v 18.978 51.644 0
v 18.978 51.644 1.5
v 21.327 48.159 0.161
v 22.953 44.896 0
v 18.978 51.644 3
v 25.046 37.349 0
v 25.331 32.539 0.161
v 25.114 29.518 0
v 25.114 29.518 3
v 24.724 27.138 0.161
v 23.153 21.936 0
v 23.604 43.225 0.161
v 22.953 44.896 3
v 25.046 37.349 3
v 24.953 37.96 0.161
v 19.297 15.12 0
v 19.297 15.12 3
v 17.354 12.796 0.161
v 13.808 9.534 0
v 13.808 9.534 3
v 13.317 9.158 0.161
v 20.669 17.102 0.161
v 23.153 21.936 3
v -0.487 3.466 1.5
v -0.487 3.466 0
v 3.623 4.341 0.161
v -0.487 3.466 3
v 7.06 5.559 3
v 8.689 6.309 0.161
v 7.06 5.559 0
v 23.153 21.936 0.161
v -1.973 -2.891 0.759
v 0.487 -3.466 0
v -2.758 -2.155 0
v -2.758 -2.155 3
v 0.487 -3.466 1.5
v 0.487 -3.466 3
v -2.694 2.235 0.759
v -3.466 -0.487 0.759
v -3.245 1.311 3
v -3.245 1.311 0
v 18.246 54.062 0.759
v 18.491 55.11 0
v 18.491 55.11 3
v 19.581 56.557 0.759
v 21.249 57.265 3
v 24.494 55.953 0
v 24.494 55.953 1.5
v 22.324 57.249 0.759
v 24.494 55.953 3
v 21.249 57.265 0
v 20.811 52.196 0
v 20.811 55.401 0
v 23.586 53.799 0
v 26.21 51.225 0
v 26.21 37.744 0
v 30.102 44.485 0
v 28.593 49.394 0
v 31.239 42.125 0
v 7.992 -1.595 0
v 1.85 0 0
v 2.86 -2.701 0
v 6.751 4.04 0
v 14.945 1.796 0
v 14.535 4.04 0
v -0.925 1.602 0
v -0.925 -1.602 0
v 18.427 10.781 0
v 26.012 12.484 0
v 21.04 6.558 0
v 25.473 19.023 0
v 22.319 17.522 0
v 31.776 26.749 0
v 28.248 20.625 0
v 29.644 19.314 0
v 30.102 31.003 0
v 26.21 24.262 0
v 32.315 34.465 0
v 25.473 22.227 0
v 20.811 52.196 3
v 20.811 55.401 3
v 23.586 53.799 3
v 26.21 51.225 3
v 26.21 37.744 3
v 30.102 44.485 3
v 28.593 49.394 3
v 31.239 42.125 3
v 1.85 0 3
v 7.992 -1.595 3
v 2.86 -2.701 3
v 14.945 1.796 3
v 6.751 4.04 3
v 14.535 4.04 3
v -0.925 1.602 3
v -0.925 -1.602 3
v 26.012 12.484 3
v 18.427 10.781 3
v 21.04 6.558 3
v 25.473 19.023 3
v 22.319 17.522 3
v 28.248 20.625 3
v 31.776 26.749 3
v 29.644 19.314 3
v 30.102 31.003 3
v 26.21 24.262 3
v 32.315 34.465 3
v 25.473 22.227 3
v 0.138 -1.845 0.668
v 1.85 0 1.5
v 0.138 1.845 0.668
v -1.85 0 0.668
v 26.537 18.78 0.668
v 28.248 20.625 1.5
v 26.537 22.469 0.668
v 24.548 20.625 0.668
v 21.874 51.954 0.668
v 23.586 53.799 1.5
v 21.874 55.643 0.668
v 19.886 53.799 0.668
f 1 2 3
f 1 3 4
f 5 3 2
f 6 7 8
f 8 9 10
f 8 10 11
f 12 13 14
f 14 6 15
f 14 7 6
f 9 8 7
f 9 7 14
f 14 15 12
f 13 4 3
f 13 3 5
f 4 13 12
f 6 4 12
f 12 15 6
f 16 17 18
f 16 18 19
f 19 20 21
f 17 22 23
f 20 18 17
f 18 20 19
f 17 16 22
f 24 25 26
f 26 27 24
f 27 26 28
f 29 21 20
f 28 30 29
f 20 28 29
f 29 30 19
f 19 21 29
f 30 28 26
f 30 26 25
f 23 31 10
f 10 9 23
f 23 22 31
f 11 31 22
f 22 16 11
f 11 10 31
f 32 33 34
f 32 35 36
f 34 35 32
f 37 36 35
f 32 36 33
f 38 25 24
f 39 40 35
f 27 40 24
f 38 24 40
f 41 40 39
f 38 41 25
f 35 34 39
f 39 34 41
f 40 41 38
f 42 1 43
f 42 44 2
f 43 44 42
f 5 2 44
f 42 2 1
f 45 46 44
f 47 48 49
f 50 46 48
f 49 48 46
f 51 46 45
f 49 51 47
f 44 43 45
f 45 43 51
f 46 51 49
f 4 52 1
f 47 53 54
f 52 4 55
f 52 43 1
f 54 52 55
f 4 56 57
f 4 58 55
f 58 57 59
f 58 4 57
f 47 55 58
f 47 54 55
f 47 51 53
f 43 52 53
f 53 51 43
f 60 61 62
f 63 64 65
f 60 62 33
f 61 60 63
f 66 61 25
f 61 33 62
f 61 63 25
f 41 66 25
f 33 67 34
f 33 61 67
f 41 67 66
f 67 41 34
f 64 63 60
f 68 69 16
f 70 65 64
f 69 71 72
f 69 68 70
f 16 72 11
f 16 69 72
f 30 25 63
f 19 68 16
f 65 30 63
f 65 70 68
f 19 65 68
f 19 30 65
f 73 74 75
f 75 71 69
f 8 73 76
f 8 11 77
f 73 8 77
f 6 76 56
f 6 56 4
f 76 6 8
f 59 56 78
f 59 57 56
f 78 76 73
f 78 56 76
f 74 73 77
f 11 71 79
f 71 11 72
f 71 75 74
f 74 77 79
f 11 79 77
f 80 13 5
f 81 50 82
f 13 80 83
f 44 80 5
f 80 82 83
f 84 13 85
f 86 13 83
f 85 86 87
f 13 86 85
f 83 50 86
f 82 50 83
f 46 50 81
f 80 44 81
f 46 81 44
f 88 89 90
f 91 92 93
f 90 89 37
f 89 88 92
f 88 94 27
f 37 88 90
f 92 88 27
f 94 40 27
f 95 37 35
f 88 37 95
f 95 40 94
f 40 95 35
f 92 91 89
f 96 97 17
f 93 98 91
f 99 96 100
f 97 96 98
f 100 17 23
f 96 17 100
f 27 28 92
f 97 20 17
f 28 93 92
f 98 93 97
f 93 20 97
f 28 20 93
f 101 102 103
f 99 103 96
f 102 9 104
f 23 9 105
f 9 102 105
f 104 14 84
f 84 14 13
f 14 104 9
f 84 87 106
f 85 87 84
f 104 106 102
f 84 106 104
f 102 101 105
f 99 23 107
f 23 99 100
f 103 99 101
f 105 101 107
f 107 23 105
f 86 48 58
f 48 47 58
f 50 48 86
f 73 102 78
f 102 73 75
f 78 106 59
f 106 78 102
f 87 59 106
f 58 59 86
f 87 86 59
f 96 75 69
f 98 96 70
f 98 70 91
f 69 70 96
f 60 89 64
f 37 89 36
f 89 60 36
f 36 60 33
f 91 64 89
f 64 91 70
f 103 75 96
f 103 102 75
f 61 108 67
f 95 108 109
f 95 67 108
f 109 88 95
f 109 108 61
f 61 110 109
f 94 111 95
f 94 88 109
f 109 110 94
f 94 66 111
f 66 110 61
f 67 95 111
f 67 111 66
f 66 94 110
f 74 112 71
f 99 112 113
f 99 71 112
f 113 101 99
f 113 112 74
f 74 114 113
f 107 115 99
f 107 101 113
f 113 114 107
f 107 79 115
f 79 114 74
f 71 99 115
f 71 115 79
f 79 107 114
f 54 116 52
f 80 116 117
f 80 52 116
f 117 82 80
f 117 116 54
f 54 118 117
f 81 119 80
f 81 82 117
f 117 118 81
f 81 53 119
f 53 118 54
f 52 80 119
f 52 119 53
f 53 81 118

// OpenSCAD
// CSG file generated from FreeCAD 0.18.1.
group() {
 group(){
polyhedron ( points = [[-0.487106,3.465938,0.000000],[-0.487106,3.465938,3.000000],[18.978024,51.643826,0.000000],[18.978024,51.643826,3.000000],[0.487106,-3.465938,0.000000],[0.487106,-3.465938,3.000000],[24.494099,55.953453,0.000000],[24.494099,55.953453,3.000000],[1.850000,-0.000000,0.000000],[28.248360,20.624659,0.000000],[23.586061,53.798641,0.000000],[1.850000,-0.000000,3.000000],[28.248360,20.624659,3.000000],[23.586061,53.798641,3.000000],[-0.487106,3.465938,1.500000],[18.978024,51.643826,1.500000],[7.059635,5.558835,0.000000],[13.807546,9.533658,0.000000],[19.296766,15.119530,0.000000],[23.153217,21.935783,0.000000],[25.114086,29.517900,0.000000],[25.045744,37.349174,0.000000],[22.952847,44.895916,0.000000],[7.059635,5.558835,3.000000],[13.807546,9.533658,3.000000],[19.296766,15.119530,3.000000],[23.153217,21.935783,3.000000],[25.114086,29.517900,3.000000],[25.045744,37.349174,3.000000],[22.952847,44.895916,3.000000],[0.487106,-3.465938,1.500000],[-3.245143,1.311123,0.000000],[-2.758038,-2.154815,0.000000],[-3.245143,1.311123,3.000000],[-2.758038,-2.154815,3.000000],[24.494099,55.953453,1.500000],[21.248955,57.264580,0.000000],[18.490917,55.109764,0.000000],[21.248955,57.264580,3.000000],[18.490917,55.109764,3.000000],[7.992446,-1.594647,0.000000],[14.944714,1.796201,0.000000],[21.040060,6.558408,0.000000],[26.012091,12.483843,0.000000],[29.643503,19.313536,0.000000],[31.775587,26.748999,0.000000],[32.315163,34.465263,0.000000],[31.238644,42.125092,0.000000],[28.593081,49.393711,0.000000],[-0.925000,1.602147,0.000000],[-0.925000,-1.602147,0.000000],[25.473360,22.226807,0.000000],[25.473360,19.022512,0.000000],[20.811062,55.400787,0.000000],[20.811062,52.196491,0.000000],[7.992446,-1.594647,3.000000],[14.944714,1.796201,3.000000],[21.040060,6.558408,3.000000],[26.012091,12.483843,3.000000],[29.643503,19.313536,3.000000],[31.775587,26.748999,3.000000],[32.315163,34.465263,3.000000],[31.238644,42.125092,3.000000],[28.593081,49.393711,3.000000],[-0.925000,-1.602147,3.000000],[-0.925000,1.602147,3.000000],[25.473360,19.022512,3.000000],[25.473360,22.226807,3.000000],[20.811062,52.196491,3.000000],[20.811062,55.400787,3.000000],[1.850000,-0.000000,1.500000],[28.248360,20.624659,1.500000],[23.586061,53.798641,1.500000],[21.326979,48.159222,0.160588],[24.953423,37.960323,0.160588],[24.724274,27.138304,0.160588],[20.669365,17.102055,0.160588],[13.316594,9.158165,0.160588],[3.623200,4.340831,0.160588],[25.330978,32.538895,0.160588],[23.603994,43.224686,0.160588],[17.354227,12.795743,0.160588],[8.688965,6.308692,0.160588],[23.153217,21.935783,0.160588],[-2.693777,2.234628,0.758522],[-1.973478,-2.890568,0.758522],[-3.465938,-0.487106,0.758522],[22.324417,57.248833,0.758522],[18.246017,54.062439,0.758522],[19.581245,56.556679,0.758522],[30.102057,44.484524,0.000000],[6.751485,4.040147,0.000000],[2.859724,-2.700582,0.000000],[26.210295,51.225250,0.000000],[14.535009,4.040147,0.000000],[18.426771,10.780876,0.000000],[22.318533,17.521606,0.000000],[26.210295,24.262335,0.000000],[30.102057,31.003063,0.000000],[26.210295,37.743793,0.000000],[30.102057,44.484524,3.000000],[6.751485,4.040147,3.000000],[2.859724,-2.700582,3.000000],[26.210295,51.225250,3.000000],[14.535009,4.040147,3.000000],[18.426771,10.780876,3.000000],[22.318533,17.521606,3.000000],[26.210295,24.262335,3.000000],[30.102057,31.003063,3.000000],[26.210295,37.743793,3.000000],[0.138191,1.844831,0.668289],[0.138191,-1.844831,0.668289],[-1.850000,-0.000000,0.668289],[26.536551,22.469490,0.668289],[26.536551,18.779827,0.668289],[24.548361,20.624659,0.668289],[21.874252,55.643471,0.668289],[21.874252,51.953808,0.668289],[19.886061,53.798641,0.668289]], triangles = [[73,15,2],[22,73,2],[15,73,3],[20,79,21],[75,27,20],[19,75,20],[28,29,80],[74,21,28],[21,79,28],[79,20,27],[28,79,27],[80,74,28],[73,22,29],[3,73,29],[80,29,22],[80,22,21],[21,74,80],[81,25,18],[17,81,18],[77,24,17],[26,76,25],[25,81,24],[17,24,81],[76,18,25],[78,0,14],[14,1,78],[23,78,1],[24,77,82],[82,16,23],[82,23,24],[17,16,82],[82,77,17],[78,23,16],[0,78,16],[75,83,26],[26,27,75],[83,76,26],[76,83,19],[19,18,76],[83,75,19],[32,4,85],[30,34,85],[85,34,32],[34,30,5],[4,30,85],[14,0,84],[34,33,86],[14,33,1],[33,14,84],[86,33,31],[0,31,84],[86,32,34],[31,32,86],[84,31,33],[37,2,88],[15,39,88],[88,39,37],[39,15,3],[2,15,88],[39,38,89],[87,35,6],[35,38,7],[38,35,87],[89,38,36],[6,36,87],[89,37,39],[36,37,89],[87,36,38],[2,54,22],[10,53,6],[93,22,54],[2,37,54],[93,54,10],[90,99,22],[93,48,22],[47,90,48],[90,22,48],[48,93,6],[93,10,6],[53,36,6],[53,54,37],[37,36,53],[92,8,40],[94,41,91],[4,92,40],[91,40,8],[0,8,49],[92,4,8],[0,91,8],[0,49,31],[32,50,4],[50,8,4],[49,50,31],[32,31,50],[40,91,41],[18,43,95],[41,94,42],[96,52,43],[42,95,43],[19,96,18],[96,43,18],[91,0,16],[18,95,17],[91,16,94],[95,42,94],[95,94,17],[94,16,17],[44,9,45],[43,52,44],[98,45,20],[97,19,20],[97,20,45],[99,98,21],[22,99,21],[20,21,98],[46,99,47],[99,90,47],[45,98,46],[98,99,46],[97,45,9],[51,52,19],[96,19,52],[9,44,52],[51,97,9],[97,51,19],[3,29,68],[13,7,69],[103,68,29],[3,68,39],[103,13,68],[100,29,109],[103,29,63],[62,63,100],[100,63,29],[63,7,103],[103,7,13],[69,7,38],[69,39,68],[39,69,38],[102,55,11],[104,101,56],[5,55,102],[101,11,55],[1,65,11],[102,11,5],[1,11,101],[1,33,65],[34,5,64],[64,5,11],[65,33,64],[34,64,33],[55,56,101],[25,105,58],[56,57,104],[106,58,66],[57,58,105],[26,25,106],[106,25,58],[101,23,1],[25,24,105],[101,104,23],[105,104,57],[105,24,104],[104,24,23],[59,60,12],[58,59,66],[108,27,60],[107,27,26],[107,60,27],[109,28,108],[29,28,109],[27,108,28],[61,62,109],[109,62,100],[60,61,108],[108,61,109],[107,12,60],[67,26,66],[106,66,26],[12,66,59],[67,12,107],[107,26,67],[48,35,63],[48,6,35],[63,35,7],[46,60,45],[44,45,60],[47,61,46],[60,46,61],[61,47,62],[63,47,48],[47,63,62],[43,44,58],[42,58,57],[56,42,57],[58,42,43],[41,55,40],[30,55,5],[30,40,55],[4,40,30],[55,41,56],[42,56,41],[58,44,59],[44,60,59],[50,111,8],[70,111,64],[111,50,64],[64,11,70],[8,111,70],[70,110,8],[64,112,65],[70,11,65],[65,110,70],[112,49,65],[8,110,49],[112,64,50],[49,112,50],[110,65,49],[52,114,9],[71,114,66],[114,52,66],[66,12,71],[9,114,71],[71,113,9],[66,115,67],[71,12,67],[67,113,71],[115,51,67],[9,113,51],[115,66,52],[51,115,52],[113,67,51],[54,117,10],[72,117,68],[117,54,68],[68,13,72],[10,117,72],[72,116,10],[68,118,69],[72,13,69],[69,116,72],[118,53,69],[10,116,53],[118,68,54],[53,118,54],[116,69,53]]);
}
}
